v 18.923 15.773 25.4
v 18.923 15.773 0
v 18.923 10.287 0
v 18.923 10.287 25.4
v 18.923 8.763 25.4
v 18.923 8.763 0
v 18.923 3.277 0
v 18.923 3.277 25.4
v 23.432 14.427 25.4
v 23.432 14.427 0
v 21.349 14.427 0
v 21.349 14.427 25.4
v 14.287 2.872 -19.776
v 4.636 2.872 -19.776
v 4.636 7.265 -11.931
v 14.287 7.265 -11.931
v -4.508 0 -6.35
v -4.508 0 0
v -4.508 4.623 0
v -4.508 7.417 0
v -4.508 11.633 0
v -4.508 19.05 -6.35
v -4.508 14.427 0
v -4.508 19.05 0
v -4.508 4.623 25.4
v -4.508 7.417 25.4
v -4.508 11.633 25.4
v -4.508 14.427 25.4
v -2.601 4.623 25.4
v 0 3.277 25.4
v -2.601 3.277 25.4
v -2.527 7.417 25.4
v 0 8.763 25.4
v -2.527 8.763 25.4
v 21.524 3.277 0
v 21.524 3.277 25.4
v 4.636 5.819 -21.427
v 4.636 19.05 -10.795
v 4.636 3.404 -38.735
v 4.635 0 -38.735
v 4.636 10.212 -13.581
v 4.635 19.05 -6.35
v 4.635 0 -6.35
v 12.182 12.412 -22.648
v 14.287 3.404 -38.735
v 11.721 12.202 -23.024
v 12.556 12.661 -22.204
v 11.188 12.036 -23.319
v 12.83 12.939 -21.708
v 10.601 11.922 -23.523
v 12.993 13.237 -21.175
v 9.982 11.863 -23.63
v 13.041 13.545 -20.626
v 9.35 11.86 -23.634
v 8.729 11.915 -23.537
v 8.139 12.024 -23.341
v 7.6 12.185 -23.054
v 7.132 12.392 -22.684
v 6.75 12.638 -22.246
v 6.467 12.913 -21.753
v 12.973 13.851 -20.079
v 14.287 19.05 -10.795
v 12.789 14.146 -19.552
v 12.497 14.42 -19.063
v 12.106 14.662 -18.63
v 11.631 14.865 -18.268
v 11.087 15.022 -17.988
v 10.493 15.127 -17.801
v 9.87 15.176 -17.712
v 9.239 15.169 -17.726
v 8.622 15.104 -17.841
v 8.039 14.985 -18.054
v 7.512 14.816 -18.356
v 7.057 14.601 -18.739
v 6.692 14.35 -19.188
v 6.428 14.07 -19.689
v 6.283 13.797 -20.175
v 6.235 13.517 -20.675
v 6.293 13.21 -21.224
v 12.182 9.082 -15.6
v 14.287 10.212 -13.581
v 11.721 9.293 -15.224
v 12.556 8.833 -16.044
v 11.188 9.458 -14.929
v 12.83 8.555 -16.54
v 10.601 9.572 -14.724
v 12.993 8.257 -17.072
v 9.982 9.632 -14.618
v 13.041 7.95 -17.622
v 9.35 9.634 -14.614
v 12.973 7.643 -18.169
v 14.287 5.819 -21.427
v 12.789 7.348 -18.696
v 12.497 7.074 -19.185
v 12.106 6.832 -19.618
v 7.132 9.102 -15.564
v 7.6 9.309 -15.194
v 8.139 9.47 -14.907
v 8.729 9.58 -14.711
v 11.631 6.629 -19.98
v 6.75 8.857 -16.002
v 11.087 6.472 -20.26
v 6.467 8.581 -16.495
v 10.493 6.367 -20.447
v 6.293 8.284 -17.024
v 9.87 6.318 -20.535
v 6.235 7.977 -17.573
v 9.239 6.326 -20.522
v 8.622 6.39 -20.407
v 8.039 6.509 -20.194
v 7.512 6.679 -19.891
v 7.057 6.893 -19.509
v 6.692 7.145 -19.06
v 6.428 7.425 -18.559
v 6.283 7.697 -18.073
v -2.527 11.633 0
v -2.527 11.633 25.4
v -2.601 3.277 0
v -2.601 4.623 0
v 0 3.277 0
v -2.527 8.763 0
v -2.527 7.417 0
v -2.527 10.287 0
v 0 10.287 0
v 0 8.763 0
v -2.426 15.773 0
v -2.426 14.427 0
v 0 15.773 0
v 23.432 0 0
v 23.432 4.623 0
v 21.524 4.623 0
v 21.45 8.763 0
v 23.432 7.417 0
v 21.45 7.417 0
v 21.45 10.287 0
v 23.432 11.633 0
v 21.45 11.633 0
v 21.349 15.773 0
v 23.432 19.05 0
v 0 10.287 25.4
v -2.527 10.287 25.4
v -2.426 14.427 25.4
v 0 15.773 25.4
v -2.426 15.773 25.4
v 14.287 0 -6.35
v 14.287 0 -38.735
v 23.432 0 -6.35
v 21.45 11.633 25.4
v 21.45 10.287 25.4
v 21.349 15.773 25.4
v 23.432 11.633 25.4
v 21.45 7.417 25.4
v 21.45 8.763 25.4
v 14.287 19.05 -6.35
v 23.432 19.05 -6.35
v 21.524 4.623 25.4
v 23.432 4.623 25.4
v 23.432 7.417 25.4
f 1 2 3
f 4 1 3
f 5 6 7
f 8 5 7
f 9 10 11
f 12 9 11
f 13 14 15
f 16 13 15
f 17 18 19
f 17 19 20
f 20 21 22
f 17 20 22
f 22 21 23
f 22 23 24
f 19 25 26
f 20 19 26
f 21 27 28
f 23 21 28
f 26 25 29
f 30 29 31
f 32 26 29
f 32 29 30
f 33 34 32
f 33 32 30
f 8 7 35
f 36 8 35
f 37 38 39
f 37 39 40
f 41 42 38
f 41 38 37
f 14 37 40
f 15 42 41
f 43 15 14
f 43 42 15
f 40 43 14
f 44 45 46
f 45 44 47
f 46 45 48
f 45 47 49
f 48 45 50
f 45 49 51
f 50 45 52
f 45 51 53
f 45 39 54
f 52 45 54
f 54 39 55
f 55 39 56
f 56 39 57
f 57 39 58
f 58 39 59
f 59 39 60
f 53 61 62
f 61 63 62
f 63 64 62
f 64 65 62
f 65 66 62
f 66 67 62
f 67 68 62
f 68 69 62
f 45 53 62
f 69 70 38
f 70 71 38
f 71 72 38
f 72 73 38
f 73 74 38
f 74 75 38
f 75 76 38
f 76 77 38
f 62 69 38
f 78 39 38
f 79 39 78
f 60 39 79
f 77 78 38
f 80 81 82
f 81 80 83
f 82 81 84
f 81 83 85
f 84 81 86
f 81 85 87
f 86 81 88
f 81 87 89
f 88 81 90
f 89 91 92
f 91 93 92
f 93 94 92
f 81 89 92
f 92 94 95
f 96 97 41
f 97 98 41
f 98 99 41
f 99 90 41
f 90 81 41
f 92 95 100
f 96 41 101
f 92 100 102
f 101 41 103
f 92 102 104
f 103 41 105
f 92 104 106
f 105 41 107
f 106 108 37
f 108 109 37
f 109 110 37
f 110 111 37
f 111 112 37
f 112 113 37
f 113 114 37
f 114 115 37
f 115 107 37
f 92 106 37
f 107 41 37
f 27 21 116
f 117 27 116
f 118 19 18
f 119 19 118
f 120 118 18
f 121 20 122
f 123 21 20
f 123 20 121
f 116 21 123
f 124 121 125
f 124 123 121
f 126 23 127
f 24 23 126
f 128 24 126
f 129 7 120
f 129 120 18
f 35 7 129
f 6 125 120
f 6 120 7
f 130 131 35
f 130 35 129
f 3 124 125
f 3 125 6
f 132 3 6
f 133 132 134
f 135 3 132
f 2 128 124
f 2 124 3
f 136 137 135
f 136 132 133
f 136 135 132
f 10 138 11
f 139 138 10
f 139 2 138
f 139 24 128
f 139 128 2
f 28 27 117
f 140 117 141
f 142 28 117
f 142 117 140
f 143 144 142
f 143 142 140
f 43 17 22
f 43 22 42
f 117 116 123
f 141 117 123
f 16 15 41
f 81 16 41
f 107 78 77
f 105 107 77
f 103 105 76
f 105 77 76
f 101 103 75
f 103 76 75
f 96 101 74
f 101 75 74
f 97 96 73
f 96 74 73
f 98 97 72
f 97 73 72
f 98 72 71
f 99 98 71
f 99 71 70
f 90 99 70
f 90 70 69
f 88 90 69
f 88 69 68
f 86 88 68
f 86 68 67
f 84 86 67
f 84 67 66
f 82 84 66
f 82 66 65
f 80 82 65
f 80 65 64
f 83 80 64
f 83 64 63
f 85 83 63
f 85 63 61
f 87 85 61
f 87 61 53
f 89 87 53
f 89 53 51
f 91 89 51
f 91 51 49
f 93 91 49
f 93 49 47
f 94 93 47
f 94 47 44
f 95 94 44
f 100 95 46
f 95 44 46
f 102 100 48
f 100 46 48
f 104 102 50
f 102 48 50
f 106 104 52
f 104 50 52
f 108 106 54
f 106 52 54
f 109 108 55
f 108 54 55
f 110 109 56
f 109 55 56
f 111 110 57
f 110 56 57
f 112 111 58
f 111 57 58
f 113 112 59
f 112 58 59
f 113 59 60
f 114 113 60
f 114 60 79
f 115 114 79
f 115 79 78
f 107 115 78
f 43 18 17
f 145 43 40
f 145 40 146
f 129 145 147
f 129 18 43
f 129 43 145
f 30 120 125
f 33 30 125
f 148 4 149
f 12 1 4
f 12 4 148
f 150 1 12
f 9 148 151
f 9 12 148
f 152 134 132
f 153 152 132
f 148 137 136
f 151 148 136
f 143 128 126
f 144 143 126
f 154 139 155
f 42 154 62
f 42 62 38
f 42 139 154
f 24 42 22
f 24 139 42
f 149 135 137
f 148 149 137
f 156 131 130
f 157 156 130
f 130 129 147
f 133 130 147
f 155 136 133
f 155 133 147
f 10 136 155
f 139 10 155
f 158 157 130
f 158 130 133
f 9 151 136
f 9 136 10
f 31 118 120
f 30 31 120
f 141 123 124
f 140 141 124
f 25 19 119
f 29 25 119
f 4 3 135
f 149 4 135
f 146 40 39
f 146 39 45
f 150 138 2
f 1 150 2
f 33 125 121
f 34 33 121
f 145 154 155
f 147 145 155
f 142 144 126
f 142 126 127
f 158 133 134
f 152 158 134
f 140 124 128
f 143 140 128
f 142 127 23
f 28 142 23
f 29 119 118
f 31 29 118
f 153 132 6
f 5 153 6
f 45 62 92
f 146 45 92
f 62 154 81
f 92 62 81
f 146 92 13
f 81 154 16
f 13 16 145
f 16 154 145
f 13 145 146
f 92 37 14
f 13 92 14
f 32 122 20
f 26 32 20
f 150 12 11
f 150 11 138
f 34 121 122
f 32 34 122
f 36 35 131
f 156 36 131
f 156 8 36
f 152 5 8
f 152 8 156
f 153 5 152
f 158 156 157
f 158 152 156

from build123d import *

# Parameters (mm, degrees)
F0_W      = 18.923
F0_H      = 19.05
F0_W_2    = 4.5085
F1_DEPTH  = 6.35
F3_DEPTH  = 25.4
F4_W      = 9.652
F4_H      = 19.05
F5_DEPTH  = 32.385
F7_DEPTH  = 25.4
F8_R      = 3.4036
F9_DEPTH  = 6.35
F11_DEPTH = 25.4


with BuildPart() as f1:
    # F0 (on Top) → F1 (new body)
    with BuildSketch(Plane.XY):
        with Locations((9.4615, 9.525)):
            Rectangle(F0_W, F0_H)
        with Locations((-2.25425, 9.525)):
            Rectangle(F0_W_2, F0_H)
        with Locations((21.17725, 9.525)):
            Rectangle(F0_W_2, F0_H)
    extrude(amount=-F1_DEPTH)

    # F2 (on face) → F3 (join)
    with BuildSketch(Plane.XY):
        Polygon((-2.5273, 10.287), (0, 10.287), (0, 15.7734), (-2.426286, 15.7734), (-2.426286, 14.4272), (-4.5085, 14.4272), (-4.5085, 11.6332), (-2.5273, 11.6332), align=None)
        Polygon((21.4503, 7.4168), (21.4503, 8.763), (18.923, 8.763), (18.923, 3.2766), (21.524463, 3.2766), (21.524463, 4.6228), (23.4315, 4.6228), (23.4315, 7.4168), align=None)
        Polygon((18.923, 15.7734), (18.923, 10.287), (21.4503, 10.287), (21.4503, 11.6332), (23.4315, 11.6332), (23.4315, 14.4272), (21.349286, 14.4272), (21.349286, 15.7734), align=None)
        Polygon((0, 3.2766), (0, 8.763), (-2.5273, 8.763), (-2.5273, 7.4168), (-4.5085, 7.4168), (-4.5085, 4.6228), (-2.601463, 4.6228), (-2.601463, 3.2766), align=None)
    extrude(amount=F3_DEPTH)

    # F4 (on face) → F5 (join)
    with BuildSketch(Plane(origin=(0, 0, -6.35), x_dir=(1, 0, 0), z_dir=(0, 0, -1))):
        with Locations((9.4615, -9.525)):
            Rectangle(F4_W, F4_H)
    extrude(amount=F5_DEPTH)

    # F6 (on face) → F7 (cut)
    with BuildSketch(Plane(origin=(4.6355, 0, 0), x_dir=(0, -1, 0), z_dir=(-1, 0, 0))):
        Polygon((-19.05, -38.735), (-3.4036, -38.735), (-19.05, -10.795), align=None)
    extrude(amount=-F7_DEPTH, mode=Mode.SUBTRACT)

    # F8 (on face) → F9 (cut)
    with BuildSketch(Plane(origin=(0, 19.104141, -10.698319), x_dir=(-1, 0, 0), z_dir=(0, 0.872506, -0.488603))):
        with Locations((-9.638287, -11.434614)):
            Circle(F8_R)
    extrude(amount=-F9_DEPTH, mode=Mode.SUBTRACT)

    # F10 (on face) → F11 (cut)
    with BuildSketch(Plane(origin=(4.6355, 0, 0), x_dir=(0, -1, 0), z_dir=(-1, 0, 0))):
        Polygon((-7.264855, -11.930685), (-10.212355, -13.581285), (-5.819029, -21.42651), (-2.871529, -19.77591), align=None)
    extrude(amount=-F11_DEPTH, mode=Mode.SUBTRACT)


solid = f1.part
